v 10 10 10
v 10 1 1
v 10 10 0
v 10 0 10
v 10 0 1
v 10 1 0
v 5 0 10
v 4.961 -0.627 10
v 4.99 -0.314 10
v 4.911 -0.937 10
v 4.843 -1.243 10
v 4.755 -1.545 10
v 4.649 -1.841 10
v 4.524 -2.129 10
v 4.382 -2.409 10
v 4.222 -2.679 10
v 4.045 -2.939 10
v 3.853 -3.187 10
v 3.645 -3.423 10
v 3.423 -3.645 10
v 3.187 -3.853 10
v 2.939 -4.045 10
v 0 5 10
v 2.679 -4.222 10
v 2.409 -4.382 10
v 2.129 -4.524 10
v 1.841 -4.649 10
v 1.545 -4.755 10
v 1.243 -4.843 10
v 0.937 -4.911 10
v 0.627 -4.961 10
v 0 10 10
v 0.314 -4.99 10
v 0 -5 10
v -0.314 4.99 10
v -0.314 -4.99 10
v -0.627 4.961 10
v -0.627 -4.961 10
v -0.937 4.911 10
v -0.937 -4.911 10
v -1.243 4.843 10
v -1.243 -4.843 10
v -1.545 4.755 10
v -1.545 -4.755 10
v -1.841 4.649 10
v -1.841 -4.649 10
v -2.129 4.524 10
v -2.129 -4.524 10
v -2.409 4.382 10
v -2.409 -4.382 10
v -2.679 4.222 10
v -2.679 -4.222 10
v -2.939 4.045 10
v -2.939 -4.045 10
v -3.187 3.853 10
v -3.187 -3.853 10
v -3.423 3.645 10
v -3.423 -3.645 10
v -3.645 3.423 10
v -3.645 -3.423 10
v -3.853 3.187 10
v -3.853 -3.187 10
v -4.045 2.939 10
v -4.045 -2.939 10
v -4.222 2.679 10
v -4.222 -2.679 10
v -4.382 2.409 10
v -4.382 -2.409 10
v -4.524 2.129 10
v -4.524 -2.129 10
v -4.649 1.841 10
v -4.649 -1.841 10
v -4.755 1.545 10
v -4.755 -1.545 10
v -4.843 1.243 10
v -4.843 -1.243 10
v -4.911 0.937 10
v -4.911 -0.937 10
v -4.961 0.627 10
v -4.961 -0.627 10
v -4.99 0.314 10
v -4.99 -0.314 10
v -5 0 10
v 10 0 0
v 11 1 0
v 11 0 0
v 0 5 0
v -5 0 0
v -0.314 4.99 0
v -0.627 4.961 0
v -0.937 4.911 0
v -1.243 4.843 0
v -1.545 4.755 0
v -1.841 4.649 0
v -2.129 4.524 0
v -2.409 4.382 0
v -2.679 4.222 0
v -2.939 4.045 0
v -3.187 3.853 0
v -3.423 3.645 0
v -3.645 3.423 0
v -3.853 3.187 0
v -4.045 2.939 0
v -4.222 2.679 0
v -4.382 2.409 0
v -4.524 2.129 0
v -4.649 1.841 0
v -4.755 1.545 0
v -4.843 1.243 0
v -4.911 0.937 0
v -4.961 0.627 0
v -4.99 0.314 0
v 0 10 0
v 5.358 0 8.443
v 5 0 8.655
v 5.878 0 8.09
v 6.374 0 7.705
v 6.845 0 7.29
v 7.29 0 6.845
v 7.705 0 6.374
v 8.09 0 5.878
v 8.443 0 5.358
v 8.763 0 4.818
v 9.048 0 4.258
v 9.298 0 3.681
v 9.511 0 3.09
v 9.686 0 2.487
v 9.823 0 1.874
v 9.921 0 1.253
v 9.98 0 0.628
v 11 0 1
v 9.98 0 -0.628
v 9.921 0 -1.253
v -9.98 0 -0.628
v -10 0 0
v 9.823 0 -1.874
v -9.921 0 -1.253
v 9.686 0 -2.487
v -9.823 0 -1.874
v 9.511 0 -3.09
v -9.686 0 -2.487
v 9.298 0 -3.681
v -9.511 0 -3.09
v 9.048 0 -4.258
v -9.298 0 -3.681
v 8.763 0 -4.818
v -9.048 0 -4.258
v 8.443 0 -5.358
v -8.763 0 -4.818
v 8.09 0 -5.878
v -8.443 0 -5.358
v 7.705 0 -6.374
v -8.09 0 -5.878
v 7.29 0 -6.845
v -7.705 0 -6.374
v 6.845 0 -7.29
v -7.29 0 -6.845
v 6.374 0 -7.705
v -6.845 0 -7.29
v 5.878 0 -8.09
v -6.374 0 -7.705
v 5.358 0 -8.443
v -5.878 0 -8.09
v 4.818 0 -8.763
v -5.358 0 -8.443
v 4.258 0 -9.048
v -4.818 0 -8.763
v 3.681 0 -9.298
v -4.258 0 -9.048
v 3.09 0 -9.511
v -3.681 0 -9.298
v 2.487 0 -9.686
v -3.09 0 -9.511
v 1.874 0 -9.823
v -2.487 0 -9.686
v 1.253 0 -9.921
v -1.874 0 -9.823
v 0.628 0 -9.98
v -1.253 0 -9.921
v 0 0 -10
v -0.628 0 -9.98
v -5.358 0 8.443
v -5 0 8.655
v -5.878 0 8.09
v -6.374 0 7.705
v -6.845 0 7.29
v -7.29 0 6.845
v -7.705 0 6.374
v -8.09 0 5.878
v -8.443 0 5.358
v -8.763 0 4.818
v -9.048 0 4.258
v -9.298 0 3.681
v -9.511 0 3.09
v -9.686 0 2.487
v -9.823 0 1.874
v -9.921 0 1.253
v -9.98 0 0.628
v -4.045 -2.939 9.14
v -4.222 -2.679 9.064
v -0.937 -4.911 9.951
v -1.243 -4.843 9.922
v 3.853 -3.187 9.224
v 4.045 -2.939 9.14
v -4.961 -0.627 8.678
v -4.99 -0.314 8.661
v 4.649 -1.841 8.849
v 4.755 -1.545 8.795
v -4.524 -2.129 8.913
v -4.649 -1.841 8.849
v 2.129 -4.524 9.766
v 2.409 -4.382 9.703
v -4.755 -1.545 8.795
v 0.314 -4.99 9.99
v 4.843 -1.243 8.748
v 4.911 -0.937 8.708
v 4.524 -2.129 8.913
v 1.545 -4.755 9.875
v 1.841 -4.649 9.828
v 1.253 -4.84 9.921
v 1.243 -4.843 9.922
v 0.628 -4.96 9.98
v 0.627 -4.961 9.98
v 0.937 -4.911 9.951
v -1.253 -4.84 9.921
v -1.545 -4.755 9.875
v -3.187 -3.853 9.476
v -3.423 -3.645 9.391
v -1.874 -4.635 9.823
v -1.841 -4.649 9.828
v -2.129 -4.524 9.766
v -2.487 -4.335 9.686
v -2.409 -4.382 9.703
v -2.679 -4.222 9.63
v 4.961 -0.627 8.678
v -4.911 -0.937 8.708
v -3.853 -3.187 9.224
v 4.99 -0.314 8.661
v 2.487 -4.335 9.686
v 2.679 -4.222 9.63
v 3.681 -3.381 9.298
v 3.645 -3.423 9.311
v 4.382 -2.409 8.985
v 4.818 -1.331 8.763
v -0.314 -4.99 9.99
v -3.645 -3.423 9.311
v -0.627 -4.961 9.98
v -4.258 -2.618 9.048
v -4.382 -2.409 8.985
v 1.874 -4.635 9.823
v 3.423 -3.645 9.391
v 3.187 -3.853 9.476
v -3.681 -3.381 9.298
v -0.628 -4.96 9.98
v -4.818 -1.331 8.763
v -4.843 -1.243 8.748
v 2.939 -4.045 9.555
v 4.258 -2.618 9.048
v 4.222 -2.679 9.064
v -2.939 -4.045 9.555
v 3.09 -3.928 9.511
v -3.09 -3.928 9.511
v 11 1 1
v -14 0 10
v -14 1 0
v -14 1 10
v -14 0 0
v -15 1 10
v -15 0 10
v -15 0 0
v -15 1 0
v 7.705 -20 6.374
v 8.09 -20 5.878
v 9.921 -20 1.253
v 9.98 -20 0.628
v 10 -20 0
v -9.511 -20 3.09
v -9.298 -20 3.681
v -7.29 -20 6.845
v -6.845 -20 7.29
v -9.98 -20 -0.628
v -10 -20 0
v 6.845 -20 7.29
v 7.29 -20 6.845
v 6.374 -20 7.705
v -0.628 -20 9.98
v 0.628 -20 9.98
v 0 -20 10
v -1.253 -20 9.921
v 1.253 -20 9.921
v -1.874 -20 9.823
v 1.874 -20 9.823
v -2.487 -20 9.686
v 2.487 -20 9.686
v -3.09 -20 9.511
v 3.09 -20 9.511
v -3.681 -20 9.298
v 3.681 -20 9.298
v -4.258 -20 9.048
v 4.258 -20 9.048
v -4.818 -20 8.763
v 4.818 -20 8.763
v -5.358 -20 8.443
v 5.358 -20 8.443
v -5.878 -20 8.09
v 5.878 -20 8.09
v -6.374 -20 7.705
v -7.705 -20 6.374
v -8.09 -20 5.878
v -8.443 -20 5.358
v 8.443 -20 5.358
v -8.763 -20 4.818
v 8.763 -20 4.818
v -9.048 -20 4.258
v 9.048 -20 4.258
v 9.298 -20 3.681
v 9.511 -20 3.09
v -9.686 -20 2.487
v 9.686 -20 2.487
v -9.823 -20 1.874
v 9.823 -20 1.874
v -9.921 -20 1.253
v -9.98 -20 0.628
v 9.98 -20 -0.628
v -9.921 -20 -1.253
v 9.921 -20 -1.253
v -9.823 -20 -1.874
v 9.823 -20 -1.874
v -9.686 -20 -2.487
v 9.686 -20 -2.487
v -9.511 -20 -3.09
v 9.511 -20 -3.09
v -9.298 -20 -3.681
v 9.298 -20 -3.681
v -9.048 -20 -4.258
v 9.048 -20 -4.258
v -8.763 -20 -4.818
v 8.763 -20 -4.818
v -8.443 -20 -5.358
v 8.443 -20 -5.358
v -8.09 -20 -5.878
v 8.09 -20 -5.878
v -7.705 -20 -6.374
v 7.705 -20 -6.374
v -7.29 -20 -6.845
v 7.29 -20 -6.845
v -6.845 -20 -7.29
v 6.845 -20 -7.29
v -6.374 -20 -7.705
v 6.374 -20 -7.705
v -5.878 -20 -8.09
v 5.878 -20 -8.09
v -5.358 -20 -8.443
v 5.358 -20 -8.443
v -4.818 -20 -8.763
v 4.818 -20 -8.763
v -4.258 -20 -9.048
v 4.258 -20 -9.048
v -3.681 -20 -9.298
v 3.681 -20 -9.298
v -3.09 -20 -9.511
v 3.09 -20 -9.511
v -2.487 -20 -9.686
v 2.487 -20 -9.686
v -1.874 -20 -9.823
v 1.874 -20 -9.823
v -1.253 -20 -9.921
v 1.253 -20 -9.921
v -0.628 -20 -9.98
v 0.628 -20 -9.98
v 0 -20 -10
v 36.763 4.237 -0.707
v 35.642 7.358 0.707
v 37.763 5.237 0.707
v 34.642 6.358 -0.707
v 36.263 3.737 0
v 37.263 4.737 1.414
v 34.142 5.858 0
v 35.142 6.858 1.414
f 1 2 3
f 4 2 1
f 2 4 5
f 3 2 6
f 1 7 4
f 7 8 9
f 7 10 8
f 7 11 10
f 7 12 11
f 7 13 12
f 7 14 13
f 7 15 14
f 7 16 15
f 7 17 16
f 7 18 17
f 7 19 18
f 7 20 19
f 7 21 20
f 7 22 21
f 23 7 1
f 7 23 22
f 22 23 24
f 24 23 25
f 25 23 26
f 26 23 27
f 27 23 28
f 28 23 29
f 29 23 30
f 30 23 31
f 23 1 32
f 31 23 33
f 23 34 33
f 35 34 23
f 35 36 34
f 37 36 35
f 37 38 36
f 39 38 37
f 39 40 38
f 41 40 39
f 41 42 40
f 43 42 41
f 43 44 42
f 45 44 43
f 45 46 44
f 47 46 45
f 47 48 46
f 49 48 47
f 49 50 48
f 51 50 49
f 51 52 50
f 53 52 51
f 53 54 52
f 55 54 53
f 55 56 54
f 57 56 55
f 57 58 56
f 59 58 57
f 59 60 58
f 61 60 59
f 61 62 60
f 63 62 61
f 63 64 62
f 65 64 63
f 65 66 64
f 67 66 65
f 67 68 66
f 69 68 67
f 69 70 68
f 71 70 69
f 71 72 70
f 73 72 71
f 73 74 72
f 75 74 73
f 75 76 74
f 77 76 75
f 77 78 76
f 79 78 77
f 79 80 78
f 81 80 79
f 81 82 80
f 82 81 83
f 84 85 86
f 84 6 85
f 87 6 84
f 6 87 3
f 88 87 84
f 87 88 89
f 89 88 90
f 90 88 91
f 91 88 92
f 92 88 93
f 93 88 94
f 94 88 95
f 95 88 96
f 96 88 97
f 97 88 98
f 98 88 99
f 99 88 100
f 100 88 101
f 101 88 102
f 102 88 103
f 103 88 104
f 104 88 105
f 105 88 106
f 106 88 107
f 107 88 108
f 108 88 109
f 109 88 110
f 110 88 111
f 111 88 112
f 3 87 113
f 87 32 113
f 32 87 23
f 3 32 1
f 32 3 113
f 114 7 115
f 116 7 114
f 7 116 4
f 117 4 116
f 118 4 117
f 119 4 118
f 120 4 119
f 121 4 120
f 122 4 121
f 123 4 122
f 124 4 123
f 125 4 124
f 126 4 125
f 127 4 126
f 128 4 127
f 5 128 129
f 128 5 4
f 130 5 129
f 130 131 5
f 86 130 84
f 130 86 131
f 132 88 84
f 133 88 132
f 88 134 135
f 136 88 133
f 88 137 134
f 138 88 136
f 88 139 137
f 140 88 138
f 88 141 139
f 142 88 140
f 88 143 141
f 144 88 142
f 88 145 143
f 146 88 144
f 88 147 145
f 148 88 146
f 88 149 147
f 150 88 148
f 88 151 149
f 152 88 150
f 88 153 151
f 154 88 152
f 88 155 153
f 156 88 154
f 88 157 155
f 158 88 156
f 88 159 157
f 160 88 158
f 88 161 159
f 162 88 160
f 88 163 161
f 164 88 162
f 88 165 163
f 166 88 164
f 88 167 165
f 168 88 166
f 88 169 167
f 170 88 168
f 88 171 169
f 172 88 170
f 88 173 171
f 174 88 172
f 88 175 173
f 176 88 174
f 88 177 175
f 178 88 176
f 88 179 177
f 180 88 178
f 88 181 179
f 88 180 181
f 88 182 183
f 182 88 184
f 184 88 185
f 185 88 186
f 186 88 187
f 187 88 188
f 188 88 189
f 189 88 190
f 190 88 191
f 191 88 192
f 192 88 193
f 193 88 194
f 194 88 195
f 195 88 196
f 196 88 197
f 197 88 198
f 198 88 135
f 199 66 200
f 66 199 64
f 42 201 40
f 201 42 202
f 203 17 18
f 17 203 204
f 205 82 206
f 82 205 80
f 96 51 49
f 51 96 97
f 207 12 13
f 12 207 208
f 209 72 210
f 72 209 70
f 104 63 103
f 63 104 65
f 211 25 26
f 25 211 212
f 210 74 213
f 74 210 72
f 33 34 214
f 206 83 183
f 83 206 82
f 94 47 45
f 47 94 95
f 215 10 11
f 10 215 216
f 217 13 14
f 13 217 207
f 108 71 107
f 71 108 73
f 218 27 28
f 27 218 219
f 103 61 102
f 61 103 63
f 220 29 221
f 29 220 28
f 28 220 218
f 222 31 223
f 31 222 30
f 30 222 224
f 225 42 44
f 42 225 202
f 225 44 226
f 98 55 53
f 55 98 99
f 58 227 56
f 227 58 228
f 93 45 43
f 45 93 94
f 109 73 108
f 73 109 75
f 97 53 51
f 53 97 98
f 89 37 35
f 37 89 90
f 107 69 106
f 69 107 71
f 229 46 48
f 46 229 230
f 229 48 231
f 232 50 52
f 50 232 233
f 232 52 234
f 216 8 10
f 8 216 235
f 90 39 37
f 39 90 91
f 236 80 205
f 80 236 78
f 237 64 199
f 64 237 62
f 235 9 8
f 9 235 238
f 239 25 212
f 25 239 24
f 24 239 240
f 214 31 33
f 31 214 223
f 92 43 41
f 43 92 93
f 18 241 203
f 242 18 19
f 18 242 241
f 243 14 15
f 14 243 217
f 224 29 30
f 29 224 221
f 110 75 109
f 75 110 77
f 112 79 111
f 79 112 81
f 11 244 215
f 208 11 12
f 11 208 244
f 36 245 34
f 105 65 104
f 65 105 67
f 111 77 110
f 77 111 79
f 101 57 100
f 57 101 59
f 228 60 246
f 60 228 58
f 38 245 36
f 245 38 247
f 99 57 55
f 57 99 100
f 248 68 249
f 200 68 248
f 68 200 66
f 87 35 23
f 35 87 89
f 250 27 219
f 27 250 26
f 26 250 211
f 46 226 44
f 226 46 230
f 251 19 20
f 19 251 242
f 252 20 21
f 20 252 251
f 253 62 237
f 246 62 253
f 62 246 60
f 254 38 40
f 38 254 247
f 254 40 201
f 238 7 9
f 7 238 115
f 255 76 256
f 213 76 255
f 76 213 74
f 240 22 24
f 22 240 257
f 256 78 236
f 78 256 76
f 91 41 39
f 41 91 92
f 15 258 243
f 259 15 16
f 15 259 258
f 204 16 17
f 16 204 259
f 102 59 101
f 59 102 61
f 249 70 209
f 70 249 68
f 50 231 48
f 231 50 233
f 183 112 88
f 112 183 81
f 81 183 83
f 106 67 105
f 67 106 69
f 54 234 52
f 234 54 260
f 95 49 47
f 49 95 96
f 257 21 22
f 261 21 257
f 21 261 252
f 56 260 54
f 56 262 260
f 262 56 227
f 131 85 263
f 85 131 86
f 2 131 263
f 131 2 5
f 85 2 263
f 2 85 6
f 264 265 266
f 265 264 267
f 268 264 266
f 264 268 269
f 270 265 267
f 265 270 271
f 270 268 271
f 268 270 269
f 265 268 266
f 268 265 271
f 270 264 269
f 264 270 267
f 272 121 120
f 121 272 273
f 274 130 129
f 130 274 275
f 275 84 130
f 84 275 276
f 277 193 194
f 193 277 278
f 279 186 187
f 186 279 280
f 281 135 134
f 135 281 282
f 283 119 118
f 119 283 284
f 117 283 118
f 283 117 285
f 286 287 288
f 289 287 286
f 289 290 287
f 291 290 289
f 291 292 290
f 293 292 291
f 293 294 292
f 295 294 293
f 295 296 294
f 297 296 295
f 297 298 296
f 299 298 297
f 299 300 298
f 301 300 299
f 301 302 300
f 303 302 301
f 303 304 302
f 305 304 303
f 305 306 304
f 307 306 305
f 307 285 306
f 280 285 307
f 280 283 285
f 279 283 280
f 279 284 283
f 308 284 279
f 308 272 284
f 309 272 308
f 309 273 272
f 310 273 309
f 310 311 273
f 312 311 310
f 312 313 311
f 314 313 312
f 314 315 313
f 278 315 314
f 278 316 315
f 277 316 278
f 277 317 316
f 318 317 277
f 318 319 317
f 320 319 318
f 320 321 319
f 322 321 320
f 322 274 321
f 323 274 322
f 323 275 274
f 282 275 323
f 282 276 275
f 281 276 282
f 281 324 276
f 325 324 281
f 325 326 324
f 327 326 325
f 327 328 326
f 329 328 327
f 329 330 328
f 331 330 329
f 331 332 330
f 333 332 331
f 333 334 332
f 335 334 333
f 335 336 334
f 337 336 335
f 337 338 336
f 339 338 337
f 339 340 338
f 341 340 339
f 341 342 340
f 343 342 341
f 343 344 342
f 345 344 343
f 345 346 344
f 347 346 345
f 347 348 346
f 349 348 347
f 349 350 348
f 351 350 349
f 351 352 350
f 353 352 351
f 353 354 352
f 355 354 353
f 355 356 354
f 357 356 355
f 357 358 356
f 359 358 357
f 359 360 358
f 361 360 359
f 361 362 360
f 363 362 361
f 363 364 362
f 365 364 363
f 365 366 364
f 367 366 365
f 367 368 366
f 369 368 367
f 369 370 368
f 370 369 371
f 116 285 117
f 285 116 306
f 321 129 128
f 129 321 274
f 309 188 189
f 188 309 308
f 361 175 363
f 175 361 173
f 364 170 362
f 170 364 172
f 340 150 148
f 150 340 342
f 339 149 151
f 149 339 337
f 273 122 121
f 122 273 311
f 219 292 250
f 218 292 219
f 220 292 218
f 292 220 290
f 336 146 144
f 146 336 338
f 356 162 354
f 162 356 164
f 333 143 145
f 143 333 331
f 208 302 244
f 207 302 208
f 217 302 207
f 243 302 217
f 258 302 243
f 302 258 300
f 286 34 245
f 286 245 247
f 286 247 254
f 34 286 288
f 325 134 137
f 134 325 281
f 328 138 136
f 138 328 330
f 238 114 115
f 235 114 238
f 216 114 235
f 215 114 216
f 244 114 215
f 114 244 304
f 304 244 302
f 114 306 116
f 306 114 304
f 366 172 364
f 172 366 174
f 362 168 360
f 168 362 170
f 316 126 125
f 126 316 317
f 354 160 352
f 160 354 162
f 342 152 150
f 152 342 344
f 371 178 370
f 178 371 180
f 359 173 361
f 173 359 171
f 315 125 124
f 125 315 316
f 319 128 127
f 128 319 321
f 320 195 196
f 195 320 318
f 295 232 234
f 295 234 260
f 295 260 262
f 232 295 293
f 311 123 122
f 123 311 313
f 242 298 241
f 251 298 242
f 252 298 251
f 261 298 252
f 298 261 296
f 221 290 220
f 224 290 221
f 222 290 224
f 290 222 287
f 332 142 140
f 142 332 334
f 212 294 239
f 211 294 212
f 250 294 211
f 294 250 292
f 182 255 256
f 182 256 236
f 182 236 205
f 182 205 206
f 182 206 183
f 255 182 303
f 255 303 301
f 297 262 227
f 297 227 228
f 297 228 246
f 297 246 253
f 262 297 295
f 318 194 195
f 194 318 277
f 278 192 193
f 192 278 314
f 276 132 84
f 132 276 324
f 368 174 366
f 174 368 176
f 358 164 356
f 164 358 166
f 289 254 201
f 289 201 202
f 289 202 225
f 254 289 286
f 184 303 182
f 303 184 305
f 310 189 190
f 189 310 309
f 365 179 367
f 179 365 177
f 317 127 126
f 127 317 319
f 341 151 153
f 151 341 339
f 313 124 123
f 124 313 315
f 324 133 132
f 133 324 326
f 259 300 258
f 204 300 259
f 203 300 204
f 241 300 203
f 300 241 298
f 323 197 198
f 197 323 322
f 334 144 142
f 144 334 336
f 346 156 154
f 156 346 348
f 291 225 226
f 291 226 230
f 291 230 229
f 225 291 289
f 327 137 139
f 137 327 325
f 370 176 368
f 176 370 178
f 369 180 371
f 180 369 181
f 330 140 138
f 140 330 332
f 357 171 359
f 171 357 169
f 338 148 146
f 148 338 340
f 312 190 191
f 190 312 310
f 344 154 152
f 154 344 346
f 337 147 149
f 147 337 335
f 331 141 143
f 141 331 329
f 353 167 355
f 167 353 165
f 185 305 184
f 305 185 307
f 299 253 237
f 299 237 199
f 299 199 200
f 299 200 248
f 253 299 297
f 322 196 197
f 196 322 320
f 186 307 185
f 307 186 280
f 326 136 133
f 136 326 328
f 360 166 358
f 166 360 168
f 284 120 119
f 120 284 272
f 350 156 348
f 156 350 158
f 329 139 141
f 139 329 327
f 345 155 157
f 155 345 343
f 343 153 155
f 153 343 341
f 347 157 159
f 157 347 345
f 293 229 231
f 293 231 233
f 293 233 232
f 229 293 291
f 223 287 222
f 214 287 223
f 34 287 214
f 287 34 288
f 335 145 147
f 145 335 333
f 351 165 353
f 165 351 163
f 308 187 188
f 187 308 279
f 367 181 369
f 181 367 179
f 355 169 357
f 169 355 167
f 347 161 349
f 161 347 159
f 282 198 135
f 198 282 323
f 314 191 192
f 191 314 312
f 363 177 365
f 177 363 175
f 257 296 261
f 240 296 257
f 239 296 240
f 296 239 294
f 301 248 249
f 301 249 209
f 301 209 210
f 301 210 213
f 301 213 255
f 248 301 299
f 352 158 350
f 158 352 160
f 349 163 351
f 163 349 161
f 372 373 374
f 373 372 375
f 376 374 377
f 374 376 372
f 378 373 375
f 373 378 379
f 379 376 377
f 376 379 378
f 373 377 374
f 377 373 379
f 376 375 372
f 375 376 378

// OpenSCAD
// facet number kind of like anti aliasing // resolution
// 1,000 seems fine -- dont do 10,000 
$fn=100;

// shapes 
cube([10,10,10]);
// % for transparency 
%sphere(10);
cylinder( r1=5, r2=5,h=10);

// translations 
translate([10,0,0]) cube([1,1,1]);

// # sign for highlighting 
#translate([-15,0,0]) cube([1,1,10]);

// rotations -- kinda the same deal as translations 
rotate(a=90,v=[1,0,0]) cylinder(r1=10,r2=10,h=20);

// can combine these 
rotate(a=90, v=[1,1,0]) translate([20,20,20]) cube([1,2,3]);
